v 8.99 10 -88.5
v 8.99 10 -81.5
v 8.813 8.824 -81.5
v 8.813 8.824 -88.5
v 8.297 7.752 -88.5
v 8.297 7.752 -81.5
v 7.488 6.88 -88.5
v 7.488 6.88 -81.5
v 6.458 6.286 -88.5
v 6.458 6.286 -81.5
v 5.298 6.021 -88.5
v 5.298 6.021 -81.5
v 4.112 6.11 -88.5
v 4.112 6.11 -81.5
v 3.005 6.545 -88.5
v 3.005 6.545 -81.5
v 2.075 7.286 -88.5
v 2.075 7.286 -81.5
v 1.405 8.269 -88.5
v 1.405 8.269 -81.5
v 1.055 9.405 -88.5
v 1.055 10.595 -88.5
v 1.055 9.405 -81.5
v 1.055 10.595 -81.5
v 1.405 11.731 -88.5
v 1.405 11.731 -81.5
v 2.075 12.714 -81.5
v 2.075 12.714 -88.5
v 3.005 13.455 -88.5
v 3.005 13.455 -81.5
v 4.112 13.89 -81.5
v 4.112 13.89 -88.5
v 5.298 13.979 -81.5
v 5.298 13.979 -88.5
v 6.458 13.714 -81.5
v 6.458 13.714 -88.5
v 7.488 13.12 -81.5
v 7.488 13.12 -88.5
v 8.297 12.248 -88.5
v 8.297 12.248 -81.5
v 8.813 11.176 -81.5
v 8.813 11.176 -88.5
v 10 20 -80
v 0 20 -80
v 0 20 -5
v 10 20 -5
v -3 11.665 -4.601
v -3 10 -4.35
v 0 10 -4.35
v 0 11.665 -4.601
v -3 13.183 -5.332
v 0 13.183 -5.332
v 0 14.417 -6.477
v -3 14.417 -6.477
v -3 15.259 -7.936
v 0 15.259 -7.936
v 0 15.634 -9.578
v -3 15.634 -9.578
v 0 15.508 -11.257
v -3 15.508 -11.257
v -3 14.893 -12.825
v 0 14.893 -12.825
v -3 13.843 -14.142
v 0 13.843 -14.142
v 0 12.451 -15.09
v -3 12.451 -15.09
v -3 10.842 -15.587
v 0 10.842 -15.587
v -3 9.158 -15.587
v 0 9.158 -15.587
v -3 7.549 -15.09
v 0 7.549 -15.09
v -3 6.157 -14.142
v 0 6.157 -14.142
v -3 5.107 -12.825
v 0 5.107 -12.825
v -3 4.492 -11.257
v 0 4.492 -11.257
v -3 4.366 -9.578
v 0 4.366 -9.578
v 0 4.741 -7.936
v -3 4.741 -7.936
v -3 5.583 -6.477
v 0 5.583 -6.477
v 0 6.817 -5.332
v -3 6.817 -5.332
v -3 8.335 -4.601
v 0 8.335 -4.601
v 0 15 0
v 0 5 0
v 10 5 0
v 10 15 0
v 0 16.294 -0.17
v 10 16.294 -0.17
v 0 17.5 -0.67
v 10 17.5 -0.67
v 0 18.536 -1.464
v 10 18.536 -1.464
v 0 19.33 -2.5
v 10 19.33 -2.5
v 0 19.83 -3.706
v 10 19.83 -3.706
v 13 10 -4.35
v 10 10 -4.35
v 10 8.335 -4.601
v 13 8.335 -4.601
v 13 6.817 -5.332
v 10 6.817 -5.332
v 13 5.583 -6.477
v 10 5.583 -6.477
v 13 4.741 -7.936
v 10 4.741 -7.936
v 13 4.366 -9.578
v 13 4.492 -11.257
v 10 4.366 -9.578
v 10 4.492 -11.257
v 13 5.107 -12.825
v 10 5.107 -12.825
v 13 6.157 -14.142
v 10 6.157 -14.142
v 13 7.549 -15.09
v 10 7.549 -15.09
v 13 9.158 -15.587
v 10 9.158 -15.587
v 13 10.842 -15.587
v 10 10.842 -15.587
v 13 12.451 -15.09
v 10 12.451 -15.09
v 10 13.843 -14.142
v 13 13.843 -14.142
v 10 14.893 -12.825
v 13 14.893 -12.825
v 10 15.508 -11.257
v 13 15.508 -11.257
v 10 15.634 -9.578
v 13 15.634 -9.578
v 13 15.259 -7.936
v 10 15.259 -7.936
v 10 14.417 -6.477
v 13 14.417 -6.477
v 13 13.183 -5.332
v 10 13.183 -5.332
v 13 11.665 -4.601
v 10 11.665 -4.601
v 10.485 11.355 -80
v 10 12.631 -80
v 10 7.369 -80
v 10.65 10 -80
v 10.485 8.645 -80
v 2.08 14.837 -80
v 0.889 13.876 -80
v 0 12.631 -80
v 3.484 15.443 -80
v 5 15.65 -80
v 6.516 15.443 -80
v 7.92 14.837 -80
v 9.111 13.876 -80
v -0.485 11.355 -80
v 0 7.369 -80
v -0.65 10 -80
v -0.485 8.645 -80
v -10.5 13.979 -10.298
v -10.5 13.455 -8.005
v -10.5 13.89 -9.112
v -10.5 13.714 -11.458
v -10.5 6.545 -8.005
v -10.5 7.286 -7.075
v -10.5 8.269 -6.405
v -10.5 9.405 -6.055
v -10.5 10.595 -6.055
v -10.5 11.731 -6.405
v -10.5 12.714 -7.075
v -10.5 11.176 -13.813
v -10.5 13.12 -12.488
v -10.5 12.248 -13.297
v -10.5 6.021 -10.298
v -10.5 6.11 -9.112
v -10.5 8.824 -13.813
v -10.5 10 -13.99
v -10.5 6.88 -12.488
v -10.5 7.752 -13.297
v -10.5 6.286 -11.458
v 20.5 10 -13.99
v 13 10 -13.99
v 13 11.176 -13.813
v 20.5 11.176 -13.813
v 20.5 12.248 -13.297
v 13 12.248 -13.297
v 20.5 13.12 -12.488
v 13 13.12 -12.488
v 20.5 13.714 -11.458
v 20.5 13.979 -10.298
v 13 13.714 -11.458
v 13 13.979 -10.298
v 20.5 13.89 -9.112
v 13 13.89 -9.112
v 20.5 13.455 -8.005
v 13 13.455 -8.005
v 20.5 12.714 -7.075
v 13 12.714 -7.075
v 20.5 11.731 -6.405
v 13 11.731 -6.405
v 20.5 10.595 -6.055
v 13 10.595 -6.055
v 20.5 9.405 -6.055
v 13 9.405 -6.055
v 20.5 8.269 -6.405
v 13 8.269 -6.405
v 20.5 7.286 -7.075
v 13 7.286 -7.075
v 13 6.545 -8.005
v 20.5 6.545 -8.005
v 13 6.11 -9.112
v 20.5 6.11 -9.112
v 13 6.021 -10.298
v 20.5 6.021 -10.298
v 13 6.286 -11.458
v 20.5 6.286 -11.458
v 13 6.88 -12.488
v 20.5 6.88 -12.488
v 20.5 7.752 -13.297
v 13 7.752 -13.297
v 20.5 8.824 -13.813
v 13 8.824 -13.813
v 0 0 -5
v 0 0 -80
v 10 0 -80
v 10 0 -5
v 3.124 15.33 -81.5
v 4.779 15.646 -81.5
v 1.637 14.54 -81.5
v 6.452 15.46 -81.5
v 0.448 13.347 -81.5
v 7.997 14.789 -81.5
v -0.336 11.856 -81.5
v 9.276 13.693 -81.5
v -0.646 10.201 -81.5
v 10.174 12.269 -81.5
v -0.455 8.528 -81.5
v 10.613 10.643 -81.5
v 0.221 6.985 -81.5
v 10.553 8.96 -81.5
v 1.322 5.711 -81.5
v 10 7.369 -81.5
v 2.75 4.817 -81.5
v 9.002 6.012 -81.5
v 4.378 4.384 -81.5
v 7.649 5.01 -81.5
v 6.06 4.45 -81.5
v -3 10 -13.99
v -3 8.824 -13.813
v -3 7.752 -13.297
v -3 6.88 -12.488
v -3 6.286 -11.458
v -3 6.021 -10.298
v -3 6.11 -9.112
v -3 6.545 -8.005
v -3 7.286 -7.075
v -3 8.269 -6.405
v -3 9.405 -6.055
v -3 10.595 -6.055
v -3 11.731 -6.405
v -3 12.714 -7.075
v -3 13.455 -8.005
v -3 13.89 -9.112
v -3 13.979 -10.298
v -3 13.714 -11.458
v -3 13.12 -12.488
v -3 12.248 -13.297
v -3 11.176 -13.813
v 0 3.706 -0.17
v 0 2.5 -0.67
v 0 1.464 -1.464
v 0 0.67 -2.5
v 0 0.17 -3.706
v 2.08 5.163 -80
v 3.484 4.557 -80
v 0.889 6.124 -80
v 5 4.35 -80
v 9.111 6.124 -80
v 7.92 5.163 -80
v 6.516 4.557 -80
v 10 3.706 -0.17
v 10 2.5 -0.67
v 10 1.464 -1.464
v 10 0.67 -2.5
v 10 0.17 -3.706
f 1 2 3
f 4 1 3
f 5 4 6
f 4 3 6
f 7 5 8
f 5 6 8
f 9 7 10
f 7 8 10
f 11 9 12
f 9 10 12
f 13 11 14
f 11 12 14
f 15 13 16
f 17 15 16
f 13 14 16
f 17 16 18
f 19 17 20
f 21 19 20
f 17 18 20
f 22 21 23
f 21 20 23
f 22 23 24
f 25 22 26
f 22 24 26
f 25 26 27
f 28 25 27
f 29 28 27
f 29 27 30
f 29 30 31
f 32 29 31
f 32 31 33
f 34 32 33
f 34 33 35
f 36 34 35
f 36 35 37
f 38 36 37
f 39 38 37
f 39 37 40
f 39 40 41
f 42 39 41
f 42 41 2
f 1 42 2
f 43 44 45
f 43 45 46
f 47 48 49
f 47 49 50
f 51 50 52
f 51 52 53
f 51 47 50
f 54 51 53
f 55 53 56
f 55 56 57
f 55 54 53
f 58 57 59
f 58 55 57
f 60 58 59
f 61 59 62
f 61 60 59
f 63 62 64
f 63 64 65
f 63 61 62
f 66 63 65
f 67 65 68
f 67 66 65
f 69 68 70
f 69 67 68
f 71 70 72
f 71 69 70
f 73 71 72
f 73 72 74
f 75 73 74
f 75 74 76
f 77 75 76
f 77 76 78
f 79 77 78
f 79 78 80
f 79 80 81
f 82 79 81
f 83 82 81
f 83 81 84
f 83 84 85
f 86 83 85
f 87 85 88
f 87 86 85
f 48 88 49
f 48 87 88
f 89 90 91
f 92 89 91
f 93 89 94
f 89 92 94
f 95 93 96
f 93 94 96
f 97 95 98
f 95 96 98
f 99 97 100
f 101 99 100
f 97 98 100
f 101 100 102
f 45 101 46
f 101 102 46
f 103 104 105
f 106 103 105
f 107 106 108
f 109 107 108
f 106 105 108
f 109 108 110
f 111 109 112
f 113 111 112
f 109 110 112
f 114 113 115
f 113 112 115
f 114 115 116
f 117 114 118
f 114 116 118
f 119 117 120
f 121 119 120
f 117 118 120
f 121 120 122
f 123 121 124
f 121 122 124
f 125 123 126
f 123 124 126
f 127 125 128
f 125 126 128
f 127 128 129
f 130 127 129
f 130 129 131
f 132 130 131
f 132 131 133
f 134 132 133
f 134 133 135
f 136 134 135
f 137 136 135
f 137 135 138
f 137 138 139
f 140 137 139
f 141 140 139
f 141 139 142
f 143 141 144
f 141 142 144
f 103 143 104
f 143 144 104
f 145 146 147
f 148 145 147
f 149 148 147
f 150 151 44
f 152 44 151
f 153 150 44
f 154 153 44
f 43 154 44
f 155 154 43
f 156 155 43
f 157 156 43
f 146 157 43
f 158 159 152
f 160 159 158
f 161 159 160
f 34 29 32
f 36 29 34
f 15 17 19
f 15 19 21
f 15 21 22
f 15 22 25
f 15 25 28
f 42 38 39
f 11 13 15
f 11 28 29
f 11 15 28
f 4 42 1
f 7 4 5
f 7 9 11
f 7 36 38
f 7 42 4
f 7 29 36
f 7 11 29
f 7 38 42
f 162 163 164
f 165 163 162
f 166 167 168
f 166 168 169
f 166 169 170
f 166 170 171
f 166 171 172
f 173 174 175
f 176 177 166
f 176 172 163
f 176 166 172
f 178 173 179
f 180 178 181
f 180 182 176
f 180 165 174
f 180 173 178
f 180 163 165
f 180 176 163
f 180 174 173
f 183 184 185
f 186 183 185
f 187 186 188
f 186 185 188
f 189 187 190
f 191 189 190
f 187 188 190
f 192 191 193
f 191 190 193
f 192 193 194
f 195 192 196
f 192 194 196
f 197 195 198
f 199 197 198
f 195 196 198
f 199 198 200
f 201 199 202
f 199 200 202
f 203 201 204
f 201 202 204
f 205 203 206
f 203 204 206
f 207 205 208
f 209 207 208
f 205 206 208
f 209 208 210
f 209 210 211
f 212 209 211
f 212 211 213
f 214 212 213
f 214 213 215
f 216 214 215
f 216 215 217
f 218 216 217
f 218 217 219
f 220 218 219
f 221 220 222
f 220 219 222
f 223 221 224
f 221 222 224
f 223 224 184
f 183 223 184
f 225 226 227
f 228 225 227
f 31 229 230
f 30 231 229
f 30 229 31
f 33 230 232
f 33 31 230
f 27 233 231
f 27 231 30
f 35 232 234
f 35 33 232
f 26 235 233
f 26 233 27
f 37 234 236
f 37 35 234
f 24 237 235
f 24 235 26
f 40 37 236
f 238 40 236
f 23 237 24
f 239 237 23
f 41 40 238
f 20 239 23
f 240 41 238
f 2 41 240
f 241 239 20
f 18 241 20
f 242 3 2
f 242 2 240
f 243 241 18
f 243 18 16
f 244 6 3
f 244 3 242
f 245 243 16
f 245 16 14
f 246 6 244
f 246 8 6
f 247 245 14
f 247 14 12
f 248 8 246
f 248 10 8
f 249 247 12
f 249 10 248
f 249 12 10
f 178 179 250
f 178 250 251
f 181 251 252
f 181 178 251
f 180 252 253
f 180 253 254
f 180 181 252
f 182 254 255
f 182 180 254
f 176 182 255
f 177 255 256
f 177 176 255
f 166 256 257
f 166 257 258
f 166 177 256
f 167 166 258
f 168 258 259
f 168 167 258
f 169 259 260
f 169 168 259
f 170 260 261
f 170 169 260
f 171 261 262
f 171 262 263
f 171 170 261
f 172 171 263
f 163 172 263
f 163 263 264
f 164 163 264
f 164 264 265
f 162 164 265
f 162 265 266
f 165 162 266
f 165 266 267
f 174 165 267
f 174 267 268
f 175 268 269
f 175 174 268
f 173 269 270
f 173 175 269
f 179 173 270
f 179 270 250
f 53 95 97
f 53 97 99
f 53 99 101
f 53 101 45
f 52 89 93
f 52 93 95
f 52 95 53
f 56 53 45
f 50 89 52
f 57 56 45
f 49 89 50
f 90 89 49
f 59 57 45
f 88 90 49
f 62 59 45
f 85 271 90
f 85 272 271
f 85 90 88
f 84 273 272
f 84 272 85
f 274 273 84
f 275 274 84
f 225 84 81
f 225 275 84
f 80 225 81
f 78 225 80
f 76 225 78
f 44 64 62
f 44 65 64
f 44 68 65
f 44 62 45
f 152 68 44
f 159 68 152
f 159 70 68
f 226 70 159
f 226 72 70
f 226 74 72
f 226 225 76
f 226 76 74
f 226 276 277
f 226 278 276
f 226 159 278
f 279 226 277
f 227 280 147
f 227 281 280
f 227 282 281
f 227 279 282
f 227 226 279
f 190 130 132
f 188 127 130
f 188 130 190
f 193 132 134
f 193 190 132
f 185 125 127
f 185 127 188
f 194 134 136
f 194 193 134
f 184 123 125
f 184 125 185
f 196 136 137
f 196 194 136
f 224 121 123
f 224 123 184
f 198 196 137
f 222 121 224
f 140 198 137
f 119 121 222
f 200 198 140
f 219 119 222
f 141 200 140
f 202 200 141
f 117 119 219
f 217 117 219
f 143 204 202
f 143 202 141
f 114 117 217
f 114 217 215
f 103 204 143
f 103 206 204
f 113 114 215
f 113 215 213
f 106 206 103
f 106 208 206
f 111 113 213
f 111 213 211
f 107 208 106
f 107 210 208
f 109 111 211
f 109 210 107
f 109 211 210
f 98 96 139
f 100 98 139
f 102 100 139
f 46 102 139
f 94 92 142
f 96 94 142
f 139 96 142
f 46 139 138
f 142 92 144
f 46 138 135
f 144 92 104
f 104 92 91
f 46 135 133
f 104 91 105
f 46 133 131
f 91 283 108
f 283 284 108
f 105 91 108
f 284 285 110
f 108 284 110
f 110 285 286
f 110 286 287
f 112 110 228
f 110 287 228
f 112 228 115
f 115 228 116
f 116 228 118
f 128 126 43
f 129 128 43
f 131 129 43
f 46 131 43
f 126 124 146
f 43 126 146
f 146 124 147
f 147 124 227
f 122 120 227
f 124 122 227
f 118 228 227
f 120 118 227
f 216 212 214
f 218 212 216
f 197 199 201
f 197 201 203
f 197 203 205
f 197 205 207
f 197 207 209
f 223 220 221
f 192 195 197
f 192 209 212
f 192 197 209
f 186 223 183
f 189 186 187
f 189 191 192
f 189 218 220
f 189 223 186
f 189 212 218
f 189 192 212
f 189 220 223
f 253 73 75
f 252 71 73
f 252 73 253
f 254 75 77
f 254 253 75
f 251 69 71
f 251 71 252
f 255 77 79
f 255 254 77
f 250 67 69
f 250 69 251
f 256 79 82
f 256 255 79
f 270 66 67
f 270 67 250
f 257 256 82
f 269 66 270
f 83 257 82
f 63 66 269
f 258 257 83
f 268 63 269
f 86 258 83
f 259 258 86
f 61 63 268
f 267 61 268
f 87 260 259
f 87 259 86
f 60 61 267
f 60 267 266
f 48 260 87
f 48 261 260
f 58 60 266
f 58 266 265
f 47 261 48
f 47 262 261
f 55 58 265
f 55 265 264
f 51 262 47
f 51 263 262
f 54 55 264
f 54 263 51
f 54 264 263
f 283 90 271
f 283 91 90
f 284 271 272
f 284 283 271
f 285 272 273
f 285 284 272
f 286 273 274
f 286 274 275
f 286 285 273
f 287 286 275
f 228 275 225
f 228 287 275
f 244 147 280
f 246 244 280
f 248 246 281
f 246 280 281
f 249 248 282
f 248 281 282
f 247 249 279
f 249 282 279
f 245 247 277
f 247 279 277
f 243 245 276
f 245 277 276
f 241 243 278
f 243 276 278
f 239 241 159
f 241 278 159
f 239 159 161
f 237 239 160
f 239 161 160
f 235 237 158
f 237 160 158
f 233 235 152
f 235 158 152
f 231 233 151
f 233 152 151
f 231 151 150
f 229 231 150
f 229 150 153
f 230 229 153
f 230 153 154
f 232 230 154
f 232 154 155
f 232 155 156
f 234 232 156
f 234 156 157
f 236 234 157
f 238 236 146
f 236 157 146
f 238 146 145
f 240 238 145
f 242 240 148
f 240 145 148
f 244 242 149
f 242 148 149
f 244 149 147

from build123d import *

# Parameters (mm, degrees)
SKETCH1_W           = 10
SKETCH1_H           = 80
BOSS_EXTRUDE1_DEPTH = 20
FILLET1_R           = 5
SKETCH3_R           = 3.99
BOSS_EXTRUDE2_DEPTH = 8.5
SKETCH4_R           = 5.65
BOSS_EXTRUDE3_DEPTH = 1.5
SKETCH2_R           = 5.65
BOSS_EXTRUDE4_DEPTH = 3
SKETCH6_R           = 3.99
BOSS_EXTRUDE5_DEPTH = 7.5
BOSS_EXTRUDE6_START = 3
SKETCH7_R           = 5.65
BOSS_EXTRUDE6_DEPTH = 3
BOSS_EXTRUDE7_START = 7.5
SKETCH9_R           = 3.99
BOSS_EXTRUDE7_DEPTH = 7.5


with BuildPart() as part:
    # Sketch1 → Boss-Extrude1 (new body)
    with BuildSketch(Plane(origin=(0, 0, 0), x_dir=(1, 0, 0), z_dir=(0, 1, 0))):
        with Locations((5, 40)):
            Rectangle(SKETCH1_W, SKETCH1_H)
    extrude(amount=BOSS_EXTRUDE1_DEPTH)

    # Fillet1
    fillet1_edges = [part.edges().sort_by_distance(p)[0] for p in [
        (5, 0, 0),
        (5, 20, 0),
    ]]
    fillet(fillet1_edges, radius=FILLET1_R)

    # Sketch3 → Boss-Extrude2 (add)
    with BuildSketch(Plane(origin=(0, 0, -80), x_dir=(-1, 0, 0), z_dir=(0, 0, -1))):
        with Locations(Location((-5, 10, 0), (0, 0, 180))):
            Circle(SKETCH3_R)
    extrude(amount=BOSS_EXTRUDE2_DEPTH)

    # Sketch4 → Boss-Extrude3 (add)
    with BuildSketch(Plane(origin=(0, 0, -80), x_dir=(-1, 0, 0), z_dir=(0, 0, -1))):
        with Locations(Location((-5, 10, 0), (0, 0, 207.753923356))):
            Circle(SKETCH4_R)
    extrude(amount=BOSS_EXTRUDE3_DEPTH)

    # Sketch2 → Boss-Extrude4 (add)
    with BuildSketch(Plane(origin=(10, 0, 0), x_dir=(0, 0, -1), z_dir=(1, 0, 0))):
        with Locations(Location((10, 10, 0), (0, 0, 180))):
            Circle(SKETCH2_R)
    extrude(amount=BOSS_EXTRUDE4_DEPTH)

    # Sketch6 → Boss-Extrude5 (add)
    with BuildSketch(Plane(origin=(13, 0, 0), x_dir=(0, 0, -1), z_dir=(1, 0, 0))):
        with Locations((10, 10)):
            Circle(SKETCH6_R)
    extrude(amount=BOSS_EXTRUDE5_DEPTH)

    # Sketch7 → Boss-Extrude6 (add)
    with BuildSketch(Plane.ZY.offset(BOSS_EXTRUDE6_START)):
        with Locations((-10, 10)):
            Circle(SKETCH7_R)
    extrude(amount=-BOSS_EXTRUDE6_DEPTH)

    # Sketch9 → Boss-Extrude7 (add)
    with BuildSketch(Plane.ZY.offset(3).offset(BOSS_EXTRUDE7_START)):
        with Locations(Location((-10, 10, 0), (0, 0, 180))):
            Circle(SKETCH9_R)
    extrude(amount=-BOSS_EXTRUDE7_DEPTH)


solid = part.part
